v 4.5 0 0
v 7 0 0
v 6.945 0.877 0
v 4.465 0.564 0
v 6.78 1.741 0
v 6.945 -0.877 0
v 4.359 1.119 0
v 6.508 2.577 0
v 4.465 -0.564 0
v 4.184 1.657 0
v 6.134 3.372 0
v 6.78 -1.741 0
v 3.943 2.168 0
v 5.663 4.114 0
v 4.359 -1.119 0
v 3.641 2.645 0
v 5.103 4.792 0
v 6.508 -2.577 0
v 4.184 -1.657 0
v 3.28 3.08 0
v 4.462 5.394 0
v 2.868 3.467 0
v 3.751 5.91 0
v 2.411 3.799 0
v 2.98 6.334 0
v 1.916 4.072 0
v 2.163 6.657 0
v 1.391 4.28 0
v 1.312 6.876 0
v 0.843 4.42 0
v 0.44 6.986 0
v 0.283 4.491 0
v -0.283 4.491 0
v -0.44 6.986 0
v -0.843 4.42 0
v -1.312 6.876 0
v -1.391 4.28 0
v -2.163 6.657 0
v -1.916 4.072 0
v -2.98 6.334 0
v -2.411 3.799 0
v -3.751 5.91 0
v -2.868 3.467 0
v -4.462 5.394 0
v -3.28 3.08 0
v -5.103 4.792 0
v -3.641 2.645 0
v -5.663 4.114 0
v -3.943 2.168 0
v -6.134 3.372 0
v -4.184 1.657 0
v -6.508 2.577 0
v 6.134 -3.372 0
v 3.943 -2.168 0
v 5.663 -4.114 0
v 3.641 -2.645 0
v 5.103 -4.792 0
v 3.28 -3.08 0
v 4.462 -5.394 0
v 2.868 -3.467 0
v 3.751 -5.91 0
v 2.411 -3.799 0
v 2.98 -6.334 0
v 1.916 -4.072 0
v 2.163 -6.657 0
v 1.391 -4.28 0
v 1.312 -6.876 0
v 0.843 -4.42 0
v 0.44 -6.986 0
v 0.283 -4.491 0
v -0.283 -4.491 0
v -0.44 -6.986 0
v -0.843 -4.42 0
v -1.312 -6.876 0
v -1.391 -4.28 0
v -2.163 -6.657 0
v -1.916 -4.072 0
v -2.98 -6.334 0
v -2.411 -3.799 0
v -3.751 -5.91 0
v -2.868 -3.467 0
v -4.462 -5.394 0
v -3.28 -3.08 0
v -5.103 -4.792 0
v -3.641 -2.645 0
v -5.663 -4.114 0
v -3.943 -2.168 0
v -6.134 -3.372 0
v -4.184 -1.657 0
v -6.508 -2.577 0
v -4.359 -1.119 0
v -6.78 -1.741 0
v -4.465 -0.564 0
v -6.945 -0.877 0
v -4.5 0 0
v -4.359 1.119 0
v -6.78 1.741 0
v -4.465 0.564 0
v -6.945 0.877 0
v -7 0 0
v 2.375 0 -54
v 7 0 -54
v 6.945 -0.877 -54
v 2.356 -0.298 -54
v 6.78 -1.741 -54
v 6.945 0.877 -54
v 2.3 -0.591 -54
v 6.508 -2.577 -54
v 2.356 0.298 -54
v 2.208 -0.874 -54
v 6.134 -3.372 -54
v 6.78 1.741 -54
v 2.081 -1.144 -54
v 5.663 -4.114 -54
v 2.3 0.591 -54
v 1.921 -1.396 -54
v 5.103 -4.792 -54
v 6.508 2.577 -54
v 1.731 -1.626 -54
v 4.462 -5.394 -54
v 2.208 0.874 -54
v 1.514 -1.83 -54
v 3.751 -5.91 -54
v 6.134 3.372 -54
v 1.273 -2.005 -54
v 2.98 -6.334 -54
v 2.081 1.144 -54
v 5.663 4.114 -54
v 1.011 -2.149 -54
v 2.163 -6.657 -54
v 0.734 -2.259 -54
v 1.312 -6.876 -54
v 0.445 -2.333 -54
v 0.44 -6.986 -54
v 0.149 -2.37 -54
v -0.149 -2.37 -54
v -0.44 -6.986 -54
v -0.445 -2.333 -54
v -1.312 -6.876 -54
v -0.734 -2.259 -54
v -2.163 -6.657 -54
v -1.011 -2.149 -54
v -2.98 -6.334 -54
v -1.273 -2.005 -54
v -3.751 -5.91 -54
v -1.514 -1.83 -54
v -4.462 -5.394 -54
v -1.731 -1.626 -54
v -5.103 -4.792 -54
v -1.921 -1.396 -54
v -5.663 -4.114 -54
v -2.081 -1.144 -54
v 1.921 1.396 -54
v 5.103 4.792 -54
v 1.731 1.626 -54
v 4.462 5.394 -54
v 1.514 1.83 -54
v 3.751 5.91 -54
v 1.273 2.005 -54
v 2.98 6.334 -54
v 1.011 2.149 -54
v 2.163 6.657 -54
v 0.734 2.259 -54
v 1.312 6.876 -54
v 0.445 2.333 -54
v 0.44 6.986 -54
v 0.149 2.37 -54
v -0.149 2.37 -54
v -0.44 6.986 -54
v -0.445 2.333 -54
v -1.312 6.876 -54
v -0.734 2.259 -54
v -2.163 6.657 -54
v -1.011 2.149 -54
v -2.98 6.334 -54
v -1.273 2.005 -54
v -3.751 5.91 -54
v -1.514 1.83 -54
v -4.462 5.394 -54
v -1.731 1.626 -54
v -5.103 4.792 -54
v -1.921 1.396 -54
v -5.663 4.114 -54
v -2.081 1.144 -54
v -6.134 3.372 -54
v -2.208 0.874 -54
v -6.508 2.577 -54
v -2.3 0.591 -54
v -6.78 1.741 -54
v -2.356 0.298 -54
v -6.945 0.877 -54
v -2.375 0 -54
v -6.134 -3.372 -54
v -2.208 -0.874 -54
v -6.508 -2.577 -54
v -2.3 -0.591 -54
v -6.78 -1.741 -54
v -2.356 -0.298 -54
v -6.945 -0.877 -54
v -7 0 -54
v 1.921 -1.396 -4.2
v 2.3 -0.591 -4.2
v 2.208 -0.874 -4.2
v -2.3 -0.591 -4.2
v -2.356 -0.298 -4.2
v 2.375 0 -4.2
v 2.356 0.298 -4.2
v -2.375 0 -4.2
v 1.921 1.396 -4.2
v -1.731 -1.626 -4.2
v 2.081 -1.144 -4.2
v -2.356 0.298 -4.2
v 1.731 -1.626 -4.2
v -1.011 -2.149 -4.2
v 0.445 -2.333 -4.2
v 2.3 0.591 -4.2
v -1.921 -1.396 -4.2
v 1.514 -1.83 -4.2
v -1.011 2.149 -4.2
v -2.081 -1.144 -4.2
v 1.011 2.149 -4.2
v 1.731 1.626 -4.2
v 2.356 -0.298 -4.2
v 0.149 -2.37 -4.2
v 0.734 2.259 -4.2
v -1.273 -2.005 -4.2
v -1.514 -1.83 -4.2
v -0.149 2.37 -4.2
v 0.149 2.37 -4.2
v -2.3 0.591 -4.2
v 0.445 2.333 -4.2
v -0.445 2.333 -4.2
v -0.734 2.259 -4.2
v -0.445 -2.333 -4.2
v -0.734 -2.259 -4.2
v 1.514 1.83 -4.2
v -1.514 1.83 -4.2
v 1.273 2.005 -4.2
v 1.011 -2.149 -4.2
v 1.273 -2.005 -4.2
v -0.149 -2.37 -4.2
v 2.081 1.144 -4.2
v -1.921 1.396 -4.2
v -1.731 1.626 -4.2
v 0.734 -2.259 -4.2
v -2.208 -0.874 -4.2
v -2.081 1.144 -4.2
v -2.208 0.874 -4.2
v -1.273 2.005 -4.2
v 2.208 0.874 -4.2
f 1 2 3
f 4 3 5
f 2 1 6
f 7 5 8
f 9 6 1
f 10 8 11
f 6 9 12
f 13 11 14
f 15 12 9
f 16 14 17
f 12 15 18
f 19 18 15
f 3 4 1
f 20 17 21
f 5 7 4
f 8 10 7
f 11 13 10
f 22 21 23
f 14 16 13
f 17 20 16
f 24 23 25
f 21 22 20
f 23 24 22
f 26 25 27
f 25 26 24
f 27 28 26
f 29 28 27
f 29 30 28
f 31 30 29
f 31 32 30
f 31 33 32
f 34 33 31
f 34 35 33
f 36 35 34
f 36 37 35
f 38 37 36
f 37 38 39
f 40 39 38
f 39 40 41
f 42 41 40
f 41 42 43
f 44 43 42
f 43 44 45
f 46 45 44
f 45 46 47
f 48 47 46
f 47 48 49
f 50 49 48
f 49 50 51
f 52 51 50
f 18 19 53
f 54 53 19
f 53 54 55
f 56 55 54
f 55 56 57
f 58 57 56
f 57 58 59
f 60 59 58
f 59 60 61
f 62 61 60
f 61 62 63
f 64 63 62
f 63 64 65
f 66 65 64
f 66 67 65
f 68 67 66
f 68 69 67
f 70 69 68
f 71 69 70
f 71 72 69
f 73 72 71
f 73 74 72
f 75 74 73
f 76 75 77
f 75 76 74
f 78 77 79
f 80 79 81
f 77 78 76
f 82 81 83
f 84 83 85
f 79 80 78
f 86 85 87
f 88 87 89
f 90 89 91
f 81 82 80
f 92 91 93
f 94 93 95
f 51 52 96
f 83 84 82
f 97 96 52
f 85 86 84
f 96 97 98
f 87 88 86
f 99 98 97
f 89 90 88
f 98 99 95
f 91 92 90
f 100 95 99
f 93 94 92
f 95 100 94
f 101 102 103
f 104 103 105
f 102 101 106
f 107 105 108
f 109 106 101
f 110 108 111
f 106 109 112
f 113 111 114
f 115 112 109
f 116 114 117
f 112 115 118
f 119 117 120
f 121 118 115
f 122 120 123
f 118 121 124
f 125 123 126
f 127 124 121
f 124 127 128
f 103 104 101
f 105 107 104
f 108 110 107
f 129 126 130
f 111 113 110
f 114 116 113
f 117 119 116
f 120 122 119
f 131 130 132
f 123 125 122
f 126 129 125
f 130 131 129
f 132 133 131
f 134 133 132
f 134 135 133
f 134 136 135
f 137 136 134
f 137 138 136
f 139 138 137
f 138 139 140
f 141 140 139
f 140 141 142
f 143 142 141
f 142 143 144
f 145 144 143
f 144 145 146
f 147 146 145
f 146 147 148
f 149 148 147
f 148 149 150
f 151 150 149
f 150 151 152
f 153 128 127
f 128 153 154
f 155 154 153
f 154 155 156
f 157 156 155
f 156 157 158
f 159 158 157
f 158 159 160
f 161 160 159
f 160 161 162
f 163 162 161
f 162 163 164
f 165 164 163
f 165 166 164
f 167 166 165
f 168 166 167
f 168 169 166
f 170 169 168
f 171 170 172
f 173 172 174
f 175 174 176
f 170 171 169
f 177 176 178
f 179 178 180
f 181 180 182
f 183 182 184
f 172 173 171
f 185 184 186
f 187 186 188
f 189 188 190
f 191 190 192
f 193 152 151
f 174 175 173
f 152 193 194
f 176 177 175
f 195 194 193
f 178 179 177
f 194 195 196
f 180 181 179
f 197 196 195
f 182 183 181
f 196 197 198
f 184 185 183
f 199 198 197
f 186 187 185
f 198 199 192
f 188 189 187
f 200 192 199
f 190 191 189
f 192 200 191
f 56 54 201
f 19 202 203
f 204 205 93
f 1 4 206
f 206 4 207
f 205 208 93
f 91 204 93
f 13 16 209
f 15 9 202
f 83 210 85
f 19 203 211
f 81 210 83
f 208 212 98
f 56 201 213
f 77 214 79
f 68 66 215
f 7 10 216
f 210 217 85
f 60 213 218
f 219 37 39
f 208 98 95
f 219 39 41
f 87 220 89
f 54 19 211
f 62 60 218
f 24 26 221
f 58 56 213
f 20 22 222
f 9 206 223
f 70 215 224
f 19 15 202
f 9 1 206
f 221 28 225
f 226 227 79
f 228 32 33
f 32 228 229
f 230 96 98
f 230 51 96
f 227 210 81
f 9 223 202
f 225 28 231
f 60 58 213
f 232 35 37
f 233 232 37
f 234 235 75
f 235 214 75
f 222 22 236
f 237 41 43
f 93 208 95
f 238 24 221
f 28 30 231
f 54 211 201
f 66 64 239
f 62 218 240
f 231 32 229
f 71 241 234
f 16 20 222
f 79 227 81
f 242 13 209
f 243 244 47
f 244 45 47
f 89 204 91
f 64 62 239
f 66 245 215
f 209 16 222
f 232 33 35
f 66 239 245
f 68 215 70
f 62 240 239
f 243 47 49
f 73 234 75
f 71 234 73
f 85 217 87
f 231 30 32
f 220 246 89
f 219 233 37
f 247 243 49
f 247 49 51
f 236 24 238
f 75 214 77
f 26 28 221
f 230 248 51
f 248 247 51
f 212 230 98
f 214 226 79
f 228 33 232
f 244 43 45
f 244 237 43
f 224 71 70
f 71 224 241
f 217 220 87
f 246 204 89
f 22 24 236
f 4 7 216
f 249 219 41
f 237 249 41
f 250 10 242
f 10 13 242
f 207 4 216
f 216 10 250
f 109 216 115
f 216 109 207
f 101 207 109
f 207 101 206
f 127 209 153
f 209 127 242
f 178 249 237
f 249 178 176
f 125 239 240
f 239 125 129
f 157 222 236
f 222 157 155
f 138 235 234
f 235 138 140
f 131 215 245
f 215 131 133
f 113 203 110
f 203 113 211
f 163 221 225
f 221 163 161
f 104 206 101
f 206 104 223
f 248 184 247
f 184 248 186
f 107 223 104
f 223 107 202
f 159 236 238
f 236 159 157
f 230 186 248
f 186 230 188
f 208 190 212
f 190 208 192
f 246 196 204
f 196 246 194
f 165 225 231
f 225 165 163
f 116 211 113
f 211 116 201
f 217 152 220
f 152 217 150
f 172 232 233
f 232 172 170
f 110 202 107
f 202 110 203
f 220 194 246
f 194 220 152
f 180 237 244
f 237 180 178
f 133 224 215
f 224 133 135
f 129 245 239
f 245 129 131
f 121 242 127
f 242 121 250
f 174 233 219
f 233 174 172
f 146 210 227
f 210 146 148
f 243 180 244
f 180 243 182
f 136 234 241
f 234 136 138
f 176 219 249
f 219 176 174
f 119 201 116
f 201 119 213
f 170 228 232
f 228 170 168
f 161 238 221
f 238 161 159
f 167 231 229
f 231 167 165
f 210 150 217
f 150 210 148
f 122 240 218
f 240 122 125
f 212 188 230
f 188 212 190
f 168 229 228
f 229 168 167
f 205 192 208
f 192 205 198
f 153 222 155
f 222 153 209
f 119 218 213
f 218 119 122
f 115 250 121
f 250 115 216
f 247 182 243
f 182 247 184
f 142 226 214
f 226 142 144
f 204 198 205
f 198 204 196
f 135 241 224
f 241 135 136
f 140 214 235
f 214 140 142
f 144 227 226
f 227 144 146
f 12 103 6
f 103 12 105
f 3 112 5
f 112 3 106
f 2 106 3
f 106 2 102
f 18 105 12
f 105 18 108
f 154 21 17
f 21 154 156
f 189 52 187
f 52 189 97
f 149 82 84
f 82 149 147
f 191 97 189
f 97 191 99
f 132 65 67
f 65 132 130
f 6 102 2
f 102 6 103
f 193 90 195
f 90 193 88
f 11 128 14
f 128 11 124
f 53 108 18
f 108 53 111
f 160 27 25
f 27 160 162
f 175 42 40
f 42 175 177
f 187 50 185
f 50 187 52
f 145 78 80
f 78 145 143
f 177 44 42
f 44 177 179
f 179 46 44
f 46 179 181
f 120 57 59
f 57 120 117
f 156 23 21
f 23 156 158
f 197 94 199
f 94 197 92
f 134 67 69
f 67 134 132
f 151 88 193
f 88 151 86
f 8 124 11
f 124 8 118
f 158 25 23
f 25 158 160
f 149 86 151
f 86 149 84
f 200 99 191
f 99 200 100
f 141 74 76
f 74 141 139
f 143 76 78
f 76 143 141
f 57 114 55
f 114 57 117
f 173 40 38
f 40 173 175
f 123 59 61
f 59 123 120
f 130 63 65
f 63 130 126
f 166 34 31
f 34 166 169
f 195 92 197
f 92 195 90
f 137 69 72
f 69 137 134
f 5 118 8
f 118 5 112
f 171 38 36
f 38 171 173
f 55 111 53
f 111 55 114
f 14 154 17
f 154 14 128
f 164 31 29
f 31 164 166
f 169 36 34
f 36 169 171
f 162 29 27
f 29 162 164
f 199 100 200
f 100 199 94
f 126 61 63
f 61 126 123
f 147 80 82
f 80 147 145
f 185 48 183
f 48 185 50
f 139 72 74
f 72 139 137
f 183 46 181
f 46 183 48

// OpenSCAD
$fn = 50;


difference() {
	union() {
		translate(v = [0, 0, -54.0000000000]) {
			cylinder(h = 54, r = 7.0000000000);
		}
		cylinder(h = 0, r = 16.0000000000);
	}
	union() {
		translate(v = [0, 0, 0]) {
			rotate(a = [0, 0, 0]) {
				difference() {
					union() {
						#translate(v = [0, 0, -54.0000000000]) {
							cylinder(h = 54, r = 2.2500000000);
						}
						#translate(v = [0, 0, -4.2000000000]) {
							cylinder(h = 4.2000000000, r1 = 2.3750000000, r2 = 4.5000000000);
						}
						#translate(v = [0, 0, -54.0000000000]) {
							cylinder(h = 54, r = 2.3750000000);
						}
						#translate(v = [0, 0, -54.0000000000]) {
							cylinder(h = 54, r = 2.2500000000);
						}
					}
					union();
				}
			}
		}
	}
}
